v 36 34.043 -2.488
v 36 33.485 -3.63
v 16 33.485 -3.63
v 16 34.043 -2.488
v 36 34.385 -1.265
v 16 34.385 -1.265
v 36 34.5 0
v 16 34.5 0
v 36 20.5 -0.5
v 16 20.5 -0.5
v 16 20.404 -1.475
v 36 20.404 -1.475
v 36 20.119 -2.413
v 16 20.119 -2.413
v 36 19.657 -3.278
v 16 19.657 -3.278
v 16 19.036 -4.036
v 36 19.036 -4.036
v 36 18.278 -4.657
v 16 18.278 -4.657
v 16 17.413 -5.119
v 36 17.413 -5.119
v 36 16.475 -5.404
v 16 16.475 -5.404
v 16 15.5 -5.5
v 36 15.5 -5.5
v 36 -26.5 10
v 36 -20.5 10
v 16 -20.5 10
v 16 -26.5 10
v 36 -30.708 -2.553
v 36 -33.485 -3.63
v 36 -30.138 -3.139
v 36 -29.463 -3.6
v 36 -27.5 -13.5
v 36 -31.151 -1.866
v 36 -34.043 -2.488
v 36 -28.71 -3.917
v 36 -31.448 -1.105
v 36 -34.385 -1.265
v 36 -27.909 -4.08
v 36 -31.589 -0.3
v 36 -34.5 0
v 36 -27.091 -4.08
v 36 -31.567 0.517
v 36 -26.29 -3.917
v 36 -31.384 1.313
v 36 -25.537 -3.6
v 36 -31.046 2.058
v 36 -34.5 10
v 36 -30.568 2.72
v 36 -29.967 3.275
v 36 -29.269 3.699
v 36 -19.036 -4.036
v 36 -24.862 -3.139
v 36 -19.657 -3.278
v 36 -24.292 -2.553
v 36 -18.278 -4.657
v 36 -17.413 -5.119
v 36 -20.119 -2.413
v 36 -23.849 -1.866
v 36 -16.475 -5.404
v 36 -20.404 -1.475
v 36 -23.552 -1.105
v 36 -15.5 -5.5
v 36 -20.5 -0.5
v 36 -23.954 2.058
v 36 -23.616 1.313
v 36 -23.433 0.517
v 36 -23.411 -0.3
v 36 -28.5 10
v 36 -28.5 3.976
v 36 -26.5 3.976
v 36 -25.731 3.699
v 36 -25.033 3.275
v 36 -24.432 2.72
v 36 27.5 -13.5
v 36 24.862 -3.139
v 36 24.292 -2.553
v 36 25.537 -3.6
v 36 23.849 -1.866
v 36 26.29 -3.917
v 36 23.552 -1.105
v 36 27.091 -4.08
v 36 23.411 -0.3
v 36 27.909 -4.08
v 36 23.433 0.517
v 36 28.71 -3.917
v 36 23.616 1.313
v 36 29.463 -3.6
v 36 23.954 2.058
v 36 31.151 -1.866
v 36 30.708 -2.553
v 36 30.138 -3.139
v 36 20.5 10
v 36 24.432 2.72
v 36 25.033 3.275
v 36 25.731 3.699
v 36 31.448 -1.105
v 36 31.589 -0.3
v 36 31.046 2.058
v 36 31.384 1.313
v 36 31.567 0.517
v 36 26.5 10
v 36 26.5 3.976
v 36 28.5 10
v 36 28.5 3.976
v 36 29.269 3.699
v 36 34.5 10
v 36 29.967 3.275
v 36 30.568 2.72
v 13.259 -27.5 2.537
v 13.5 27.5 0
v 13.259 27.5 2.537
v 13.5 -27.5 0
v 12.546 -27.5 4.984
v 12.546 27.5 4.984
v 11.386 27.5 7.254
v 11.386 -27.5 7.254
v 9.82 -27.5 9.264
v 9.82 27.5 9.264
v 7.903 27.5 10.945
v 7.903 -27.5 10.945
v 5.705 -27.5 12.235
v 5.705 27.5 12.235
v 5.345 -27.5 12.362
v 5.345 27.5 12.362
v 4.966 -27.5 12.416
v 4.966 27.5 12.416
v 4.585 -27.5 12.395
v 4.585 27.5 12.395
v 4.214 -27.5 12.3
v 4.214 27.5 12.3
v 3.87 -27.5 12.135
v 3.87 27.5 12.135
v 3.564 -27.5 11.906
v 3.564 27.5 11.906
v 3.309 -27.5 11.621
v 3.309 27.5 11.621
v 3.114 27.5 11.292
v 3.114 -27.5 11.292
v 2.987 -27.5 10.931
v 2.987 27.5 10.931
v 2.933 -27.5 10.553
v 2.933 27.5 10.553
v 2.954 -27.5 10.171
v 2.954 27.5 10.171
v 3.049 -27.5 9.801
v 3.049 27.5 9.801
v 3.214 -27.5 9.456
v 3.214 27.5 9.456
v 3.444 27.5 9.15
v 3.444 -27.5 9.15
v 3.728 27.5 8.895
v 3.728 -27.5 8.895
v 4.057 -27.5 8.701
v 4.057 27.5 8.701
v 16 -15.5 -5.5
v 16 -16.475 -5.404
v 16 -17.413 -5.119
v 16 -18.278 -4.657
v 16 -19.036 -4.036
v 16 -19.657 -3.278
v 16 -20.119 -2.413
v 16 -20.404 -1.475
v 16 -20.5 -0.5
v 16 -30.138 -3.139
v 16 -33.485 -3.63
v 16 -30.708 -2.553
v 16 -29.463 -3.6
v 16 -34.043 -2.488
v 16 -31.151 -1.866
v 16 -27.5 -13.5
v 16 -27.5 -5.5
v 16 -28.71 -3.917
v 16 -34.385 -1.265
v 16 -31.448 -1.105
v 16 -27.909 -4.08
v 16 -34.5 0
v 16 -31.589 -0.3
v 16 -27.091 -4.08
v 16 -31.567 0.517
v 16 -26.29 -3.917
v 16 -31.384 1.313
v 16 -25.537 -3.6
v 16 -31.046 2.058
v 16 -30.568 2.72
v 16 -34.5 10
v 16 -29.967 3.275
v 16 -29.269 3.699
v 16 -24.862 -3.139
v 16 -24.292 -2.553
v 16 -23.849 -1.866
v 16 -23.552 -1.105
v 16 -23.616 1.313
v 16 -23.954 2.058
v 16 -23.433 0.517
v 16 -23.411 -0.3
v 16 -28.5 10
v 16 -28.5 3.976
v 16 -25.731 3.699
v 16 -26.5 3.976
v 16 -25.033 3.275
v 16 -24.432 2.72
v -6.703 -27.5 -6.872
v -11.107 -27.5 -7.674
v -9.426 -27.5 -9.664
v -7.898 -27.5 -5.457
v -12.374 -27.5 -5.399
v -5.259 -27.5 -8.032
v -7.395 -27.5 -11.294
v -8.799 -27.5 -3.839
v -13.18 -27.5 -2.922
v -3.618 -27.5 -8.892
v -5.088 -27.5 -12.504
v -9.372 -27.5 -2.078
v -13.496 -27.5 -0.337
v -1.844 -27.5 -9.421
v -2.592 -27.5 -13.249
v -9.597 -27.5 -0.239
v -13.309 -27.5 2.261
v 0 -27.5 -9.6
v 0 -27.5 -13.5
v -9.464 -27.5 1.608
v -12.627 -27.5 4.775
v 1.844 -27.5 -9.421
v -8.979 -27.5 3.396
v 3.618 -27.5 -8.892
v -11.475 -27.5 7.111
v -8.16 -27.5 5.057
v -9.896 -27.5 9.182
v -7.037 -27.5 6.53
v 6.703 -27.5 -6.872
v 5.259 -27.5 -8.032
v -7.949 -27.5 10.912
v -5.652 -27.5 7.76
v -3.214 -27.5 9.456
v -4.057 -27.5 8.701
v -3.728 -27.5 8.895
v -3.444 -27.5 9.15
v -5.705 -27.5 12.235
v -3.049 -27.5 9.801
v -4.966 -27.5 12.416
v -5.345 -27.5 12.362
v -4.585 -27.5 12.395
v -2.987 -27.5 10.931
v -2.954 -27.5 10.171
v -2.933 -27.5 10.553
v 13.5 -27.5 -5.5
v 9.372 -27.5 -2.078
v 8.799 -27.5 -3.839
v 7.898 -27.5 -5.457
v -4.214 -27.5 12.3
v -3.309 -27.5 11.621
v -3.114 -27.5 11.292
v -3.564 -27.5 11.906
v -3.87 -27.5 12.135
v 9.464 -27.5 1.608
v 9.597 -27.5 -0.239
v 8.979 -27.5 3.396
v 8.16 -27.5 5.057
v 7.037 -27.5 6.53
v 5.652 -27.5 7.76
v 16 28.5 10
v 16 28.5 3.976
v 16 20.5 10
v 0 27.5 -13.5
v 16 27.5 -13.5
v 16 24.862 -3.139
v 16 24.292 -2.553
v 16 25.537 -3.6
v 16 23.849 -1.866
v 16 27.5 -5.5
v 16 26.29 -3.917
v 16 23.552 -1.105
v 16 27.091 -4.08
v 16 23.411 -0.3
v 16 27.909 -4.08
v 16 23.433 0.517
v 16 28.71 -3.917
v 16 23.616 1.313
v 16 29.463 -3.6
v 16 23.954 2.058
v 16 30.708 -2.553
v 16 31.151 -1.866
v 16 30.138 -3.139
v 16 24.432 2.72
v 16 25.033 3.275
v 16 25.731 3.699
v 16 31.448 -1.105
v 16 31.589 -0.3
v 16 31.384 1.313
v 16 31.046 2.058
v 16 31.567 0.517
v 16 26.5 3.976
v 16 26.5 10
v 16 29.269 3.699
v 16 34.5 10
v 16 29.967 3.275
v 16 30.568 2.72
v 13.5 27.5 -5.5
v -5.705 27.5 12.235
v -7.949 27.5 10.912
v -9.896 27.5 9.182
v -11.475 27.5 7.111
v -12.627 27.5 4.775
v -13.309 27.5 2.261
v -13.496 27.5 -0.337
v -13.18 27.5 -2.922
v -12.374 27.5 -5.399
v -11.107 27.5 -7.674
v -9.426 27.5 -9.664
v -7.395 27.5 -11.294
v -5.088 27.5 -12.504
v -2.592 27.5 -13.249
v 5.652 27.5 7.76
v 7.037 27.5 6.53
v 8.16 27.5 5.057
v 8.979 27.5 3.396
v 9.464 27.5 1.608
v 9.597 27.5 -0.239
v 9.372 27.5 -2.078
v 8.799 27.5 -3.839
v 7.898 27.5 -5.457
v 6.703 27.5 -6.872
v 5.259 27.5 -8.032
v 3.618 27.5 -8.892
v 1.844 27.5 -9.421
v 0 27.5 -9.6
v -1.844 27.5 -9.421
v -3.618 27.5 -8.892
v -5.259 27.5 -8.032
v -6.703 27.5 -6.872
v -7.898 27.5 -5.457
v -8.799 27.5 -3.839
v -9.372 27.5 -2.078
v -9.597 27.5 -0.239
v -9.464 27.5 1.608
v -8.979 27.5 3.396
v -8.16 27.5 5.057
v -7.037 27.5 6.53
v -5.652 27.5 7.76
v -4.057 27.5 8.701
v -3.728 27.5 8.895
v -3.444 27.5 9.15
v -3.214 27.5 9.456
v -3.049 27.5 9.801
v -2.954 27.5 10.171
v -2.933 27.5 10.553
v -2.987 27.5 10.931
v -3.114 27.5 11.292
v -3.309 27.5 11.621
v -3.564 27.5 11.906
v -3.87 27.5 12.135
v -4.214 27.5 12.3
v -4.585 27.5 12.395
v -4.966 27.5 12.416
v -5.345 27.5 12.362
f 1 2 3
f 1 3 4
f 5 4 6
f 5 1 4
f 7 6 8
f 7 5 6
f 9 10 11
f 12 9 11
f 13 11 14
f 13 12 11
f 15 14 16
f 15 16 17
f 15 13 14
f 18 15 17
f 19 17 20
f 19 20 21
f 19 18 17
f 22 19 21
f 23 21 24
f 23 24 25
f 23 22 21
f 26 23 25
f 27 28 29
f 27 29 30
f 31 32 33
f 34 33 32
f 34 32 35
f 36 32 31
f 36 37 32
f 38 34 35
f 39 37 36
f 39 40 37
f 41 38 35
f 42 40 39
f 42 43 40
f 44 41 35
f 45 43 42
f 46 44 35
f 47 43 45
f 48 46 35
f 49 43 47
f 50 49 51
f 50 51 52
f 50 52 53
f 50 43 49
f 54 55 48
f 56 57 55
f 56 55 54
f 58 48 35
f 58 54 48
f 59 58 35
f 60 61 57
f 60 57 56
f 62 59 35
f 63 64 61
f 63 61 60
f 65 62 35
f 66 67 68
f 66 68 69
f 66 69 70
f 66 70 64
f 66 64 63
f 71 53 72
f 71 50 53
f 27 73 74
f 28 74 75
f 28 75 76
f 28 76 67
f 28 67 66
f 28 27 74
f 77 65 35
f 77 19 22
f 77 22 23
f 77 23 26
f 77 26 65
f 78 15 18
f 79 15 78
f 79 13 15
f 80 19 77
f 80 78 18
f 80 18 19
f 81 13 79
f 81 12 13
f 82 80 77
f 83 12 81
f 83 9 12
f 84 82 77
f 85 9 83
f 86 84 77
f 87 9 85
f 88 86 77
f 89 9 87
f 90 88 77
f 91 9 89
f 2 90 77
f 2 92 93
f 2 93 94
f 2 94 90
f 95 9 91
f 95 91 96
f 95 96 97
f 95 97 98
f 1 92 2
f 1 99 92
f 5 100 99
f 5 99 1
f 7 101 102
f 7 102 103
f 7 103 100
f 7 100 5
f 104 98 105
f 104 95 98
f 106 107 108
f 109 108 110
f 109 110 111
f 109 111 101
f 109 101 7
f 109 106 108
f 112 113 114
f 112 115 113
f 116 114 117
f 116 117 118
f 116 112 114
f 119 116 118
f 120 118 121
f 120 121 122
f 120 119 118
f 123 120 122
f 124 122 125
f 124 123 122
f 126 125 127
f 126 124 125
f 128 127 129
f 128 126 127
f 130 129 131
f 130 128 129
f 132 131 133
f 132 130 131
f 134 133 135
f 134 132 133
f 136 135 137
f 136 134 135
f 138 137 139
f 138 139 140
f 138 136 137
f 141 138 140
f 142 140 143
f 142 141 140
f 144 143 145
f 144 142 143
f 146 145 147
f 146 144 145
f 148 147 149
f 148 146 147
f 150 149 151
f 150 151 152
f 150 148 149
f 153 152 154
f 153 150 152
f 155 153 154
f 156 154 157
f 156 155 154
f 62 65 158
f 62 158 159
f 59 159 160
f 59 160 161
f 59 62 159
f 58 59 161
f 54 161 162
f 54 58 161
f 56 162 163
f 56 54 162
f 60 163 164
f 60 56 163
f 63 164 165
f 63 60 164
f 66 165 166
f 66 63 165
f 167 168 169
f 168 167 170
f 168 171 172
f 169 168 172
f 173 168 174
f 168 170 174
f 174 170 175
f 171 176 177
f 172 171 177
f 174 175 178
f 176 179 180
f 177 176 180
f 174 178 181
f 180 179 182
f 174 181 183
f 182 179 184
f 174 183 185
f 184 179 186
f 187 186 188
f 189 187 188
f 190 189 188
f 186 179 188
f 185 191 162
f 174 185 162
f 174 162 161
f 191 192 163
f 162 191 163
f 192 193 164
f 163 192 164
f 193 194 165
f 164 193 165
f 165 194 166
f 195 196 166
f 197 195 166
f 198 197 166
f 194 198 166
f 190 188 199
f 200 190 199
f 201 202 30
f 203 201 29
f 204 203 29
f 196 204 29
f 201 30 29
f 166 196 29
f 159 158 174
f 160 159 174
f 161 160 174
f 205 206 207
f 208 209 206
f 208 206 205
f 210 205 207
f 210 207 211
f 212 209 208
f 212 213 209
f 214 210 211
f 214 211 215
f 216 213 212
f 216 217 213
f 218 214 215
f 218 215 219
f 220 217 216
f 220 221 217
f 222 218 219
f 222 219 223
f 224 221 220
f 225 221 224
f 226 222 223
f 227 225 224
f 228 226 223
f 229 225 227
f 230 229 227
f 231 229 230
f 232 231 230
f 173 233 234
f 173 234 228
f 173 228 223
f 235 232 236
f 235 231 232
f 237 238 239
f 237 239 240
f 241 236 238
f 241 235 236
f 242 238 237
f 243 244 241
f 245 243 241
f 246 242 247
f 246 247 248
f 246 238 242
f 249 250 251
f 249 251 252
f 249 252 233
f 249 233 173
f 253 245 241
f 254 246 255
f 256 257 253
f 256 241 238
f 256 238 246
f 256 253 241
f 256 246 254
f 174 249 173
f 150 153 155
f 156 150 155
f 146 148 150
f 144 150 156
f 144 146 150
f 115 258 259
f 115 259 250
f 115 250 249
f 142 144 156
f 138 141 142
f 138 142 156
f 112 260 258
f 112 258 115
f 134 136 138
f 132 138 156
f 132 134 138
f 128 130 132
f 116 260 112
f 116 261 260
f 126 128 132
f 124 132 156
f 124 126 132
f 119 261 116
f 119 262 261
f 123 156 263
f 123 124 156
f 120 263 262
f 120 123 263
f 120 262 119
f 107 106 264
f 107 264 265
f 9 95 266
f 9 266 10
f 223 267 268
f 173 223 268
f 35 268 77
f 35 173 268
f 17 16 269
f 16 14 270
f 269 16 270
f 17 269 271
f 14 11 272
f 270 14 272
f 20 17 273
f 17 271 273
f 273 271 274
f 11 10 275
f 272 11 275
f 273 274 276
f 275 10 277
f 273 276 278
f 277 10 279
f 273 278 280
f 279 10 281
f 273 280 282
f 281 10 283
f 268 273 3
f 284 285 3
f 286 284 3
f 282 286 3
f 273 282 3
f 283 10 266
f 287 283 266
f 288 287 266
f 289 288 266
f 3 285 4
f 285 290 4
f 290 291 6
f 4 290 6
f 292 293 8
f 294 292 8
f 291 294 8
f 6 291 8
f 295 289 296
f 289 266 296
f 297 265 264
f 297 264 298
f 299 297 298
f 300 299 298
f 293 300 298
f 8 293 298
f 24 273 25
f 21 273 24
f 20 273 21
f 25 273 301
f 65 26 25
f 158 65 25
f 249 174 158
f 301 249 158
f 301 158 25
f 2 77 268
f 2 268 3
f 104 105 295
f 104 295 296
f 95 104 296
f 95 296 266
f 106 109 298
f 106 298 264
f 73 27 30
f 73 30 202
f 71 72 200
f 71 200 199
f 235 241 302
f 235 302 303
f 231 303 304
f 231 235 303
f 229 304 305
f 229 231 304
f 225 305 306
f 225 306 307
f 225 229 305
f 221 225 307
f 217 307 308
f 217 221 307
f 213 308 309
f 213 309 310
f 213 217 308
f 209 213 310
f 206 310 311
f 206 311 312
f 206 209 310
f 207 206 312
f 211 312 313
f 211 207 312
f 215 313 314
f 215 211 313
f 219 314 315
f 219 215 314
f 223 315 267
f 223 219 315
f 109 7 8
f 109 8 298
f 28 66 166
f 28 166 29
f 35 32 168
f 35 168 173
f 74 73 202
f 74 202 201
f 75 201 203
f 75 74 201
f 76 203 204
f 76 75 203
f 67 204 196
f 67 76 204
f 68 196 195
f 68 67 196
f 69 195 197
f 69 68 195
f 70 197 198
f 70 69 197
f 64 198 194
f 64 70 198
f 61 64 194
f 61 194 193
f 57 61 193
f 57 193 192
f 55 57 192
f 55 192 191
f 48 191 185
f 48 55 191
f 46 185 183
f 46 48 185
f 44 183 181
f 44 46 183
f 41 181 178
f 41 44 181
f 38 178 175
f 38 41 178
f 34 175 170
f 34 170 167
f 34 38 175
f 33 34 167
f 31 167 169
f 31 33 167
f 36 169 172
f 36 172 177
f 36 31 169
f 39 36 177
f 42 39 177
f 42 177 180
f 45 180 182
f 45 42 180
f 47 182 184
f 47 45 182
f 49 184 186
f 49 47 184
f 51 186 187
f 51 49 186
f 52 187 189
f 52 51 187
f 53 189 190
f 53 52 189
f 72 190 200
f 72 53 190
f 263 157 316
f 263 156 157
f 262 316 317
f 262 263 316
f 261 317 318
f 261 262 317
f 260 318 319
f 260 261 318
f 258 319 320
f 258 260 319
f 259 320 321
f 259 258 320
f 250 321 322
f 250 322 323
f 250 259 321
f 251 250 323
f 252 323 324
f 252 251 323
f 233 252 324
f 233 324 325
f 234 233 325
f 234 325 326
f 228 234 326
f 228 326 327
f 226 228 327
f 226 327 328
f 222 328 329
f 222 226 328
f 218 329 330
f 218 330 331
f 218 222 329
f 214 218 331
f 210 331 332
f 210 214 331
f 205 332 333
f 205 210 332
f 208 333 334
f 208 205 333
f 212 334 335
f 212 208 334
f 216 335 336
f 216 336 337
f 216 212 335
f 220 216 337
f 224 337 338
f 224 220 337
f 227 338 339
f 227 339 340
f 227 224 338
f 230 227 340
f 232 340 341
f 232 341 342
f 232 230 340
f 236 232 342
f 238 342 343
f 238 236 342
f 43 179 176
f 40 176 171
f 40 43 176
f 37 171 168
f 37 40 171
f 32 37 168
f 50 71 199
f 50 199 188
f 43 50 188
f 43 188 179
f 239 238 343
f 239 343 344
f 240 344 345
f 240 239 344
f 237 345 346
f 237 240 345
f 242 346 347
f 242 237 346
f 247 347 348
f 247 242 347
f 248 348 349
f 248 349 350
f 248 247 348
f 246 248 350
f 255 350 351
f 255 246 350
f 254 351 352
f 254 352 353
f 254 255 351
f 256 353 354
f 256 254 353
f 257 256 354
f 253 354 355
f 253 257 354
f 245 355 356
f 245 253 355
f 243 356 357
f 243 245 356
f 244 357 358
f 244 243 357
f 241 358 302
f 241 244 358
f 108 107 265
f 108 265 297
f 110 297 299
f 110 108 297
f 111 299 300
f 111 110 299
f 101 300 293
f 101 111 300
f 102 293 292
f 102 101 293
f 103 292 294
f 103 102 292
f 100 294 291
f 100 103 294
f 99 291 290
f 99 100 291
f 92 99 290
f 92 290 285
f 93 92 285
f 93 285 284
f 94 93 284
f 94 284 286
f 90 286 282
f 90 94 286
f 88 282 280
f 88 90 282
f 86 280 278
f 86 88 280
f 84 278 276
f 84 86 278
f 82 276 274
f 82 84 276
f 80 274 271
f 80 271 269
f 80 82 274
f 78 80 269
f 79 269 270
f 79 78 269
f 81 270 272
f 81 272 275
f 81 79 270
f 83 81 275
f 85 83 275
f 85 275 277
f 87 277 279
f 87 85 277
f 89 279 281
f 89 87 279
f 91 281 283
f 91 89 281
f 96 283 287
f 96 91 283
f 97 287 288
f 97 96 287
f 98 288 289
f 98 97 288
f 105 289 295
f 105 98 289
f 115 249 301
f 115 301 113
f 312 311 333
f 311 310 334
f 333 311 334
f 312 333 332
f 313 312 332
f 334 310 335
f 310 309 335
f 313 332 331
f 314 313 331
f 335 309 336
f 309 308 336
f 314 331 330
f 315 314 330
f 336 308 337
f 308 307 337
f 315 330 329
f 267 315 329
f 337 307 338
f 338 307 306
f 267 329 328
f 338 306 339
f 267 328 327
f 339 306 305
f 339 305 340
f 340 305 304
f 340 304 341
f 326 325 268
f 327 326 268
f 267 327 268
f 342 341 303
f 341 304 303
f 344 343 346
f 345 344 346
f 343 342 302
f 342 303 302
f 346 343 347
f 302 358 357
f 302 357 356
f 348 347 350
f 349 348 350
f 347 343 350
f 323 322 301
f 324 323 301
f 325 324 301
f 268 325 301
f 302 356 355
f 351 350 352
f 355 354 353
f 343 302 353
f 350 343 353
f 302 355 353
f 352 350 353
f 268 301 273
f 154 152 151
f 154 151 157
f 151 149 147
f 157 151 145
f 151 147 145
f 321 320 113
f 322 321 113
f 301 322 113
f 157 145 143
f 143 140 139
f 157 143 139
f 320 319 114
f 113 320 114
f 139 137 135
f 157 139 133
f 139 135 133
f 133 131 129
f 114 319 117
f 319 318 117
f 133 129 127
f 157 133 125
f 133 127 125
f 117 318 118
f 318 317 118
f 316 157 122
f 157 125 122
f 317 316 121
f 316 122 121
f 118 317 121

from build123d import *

# Parameters (mm, degrees)
F1_DEPTH = 27.5
F3_DEPTH = 20


with BuildPart() as f1:
    # F0 (on Front) → F1 (new body, symmetric)
    with BuildSketch(Plane.XZ):
        with BuildLine():
            ThreePointArc((4.057135, 8.700555), (0, -9.6), (-4.057135, 8.700555))
            ThreePointArc((-4.057135, 8.700555), (-3.113941, 11.291961), (-5.705347, 12.235155))
            ThreePointArc((-5.705347, 12.235155), (-13.179996, -2.921935), (0, -13.5))
            Line((0, -13.5), (36, -13.5))
            Line((36, -13.5), (36, -5.5))
            Line((36, -5.5), (13.5, -5.5))
            Line((13.5, -5.5), (13.5, 0))
            ThreePointArc((13.5, 0), (11.385785, 7.253545), (5.705347, 12.235155))
            ThreePointArc((5.705347, 12.235155), (3.113941, 11.291961), (4.057135, 8.700555))
        make_face()
    extrude(amount=F1_DEPTH, both=True)

    # F2 (on face) → F3 (join)
    with BuildSketch(Plane.YZ.offset(36)):
        with BuildLine():
            ThreePointArc((-26.5, 3.976179), (-27.5, -4.1), (-28.5, 3.976179))
            Line((-28.5, 3.976179), (-28.5, 10))
            Line((-28.5, 10), (-34.5, 10))
            Line((-34.5, 10), (-34.5, 0))
            ThreePointArc((-34.5, 0), (-34.241597, -1.884376), (-33.485465, -3.62963))
            Line((-33.485465, -3.62963), (-27.5, -13.5))
            Line((-27.5, -13.5), (0, -13.5))
            Line((0, -13.5), (27.5, -13.5))
            Line((27.5, -13.5), (33.485465, -3.62963))
            ThreePointArc((33.485465, -3.62963), (34.241597, -1.884376), (34.5, 0))
            Line((34.5, 0), (34.5, 10))
            Line((34.5, 10), (28.5, 10))
            Line((28.5, 10), (28.5, 3.976179))
            ThreePointArc((28.5, 3.976179), (27.5, -4.1), (26.5, 3.976179))
            Line((26.5, 3.976179), (26.5, 10))
            Line((26.5, 10), (20.5, 10))
            Line((20.5, 10), (20.5, 0))
            Line((20.5, 0), (20.5, -0.5))
            ThreePointArc((20.5, -0.5), (19.035534, -4.035534), (15.5, -5.5))
            Line((15.5, -5.5), (0, -5.5))
            Line((0, -5.5), (-15.5, -5.5))
            ThreePointArc((-15.5, -5.5), (-19.035534, -4.035534), (-20.5, -0.5))
            Line((-20.5, -0.5), (-20.5, 0))
            Line((-20.5, 0), (-20.5, 10))
            Line((-20.5, 10), (-26.5, 10))
            Line((-26.5, 10), (-26.5, 3.976179))
        make_face()
    extrude(amount=-F3_DEPTH)


solid = f1.part
